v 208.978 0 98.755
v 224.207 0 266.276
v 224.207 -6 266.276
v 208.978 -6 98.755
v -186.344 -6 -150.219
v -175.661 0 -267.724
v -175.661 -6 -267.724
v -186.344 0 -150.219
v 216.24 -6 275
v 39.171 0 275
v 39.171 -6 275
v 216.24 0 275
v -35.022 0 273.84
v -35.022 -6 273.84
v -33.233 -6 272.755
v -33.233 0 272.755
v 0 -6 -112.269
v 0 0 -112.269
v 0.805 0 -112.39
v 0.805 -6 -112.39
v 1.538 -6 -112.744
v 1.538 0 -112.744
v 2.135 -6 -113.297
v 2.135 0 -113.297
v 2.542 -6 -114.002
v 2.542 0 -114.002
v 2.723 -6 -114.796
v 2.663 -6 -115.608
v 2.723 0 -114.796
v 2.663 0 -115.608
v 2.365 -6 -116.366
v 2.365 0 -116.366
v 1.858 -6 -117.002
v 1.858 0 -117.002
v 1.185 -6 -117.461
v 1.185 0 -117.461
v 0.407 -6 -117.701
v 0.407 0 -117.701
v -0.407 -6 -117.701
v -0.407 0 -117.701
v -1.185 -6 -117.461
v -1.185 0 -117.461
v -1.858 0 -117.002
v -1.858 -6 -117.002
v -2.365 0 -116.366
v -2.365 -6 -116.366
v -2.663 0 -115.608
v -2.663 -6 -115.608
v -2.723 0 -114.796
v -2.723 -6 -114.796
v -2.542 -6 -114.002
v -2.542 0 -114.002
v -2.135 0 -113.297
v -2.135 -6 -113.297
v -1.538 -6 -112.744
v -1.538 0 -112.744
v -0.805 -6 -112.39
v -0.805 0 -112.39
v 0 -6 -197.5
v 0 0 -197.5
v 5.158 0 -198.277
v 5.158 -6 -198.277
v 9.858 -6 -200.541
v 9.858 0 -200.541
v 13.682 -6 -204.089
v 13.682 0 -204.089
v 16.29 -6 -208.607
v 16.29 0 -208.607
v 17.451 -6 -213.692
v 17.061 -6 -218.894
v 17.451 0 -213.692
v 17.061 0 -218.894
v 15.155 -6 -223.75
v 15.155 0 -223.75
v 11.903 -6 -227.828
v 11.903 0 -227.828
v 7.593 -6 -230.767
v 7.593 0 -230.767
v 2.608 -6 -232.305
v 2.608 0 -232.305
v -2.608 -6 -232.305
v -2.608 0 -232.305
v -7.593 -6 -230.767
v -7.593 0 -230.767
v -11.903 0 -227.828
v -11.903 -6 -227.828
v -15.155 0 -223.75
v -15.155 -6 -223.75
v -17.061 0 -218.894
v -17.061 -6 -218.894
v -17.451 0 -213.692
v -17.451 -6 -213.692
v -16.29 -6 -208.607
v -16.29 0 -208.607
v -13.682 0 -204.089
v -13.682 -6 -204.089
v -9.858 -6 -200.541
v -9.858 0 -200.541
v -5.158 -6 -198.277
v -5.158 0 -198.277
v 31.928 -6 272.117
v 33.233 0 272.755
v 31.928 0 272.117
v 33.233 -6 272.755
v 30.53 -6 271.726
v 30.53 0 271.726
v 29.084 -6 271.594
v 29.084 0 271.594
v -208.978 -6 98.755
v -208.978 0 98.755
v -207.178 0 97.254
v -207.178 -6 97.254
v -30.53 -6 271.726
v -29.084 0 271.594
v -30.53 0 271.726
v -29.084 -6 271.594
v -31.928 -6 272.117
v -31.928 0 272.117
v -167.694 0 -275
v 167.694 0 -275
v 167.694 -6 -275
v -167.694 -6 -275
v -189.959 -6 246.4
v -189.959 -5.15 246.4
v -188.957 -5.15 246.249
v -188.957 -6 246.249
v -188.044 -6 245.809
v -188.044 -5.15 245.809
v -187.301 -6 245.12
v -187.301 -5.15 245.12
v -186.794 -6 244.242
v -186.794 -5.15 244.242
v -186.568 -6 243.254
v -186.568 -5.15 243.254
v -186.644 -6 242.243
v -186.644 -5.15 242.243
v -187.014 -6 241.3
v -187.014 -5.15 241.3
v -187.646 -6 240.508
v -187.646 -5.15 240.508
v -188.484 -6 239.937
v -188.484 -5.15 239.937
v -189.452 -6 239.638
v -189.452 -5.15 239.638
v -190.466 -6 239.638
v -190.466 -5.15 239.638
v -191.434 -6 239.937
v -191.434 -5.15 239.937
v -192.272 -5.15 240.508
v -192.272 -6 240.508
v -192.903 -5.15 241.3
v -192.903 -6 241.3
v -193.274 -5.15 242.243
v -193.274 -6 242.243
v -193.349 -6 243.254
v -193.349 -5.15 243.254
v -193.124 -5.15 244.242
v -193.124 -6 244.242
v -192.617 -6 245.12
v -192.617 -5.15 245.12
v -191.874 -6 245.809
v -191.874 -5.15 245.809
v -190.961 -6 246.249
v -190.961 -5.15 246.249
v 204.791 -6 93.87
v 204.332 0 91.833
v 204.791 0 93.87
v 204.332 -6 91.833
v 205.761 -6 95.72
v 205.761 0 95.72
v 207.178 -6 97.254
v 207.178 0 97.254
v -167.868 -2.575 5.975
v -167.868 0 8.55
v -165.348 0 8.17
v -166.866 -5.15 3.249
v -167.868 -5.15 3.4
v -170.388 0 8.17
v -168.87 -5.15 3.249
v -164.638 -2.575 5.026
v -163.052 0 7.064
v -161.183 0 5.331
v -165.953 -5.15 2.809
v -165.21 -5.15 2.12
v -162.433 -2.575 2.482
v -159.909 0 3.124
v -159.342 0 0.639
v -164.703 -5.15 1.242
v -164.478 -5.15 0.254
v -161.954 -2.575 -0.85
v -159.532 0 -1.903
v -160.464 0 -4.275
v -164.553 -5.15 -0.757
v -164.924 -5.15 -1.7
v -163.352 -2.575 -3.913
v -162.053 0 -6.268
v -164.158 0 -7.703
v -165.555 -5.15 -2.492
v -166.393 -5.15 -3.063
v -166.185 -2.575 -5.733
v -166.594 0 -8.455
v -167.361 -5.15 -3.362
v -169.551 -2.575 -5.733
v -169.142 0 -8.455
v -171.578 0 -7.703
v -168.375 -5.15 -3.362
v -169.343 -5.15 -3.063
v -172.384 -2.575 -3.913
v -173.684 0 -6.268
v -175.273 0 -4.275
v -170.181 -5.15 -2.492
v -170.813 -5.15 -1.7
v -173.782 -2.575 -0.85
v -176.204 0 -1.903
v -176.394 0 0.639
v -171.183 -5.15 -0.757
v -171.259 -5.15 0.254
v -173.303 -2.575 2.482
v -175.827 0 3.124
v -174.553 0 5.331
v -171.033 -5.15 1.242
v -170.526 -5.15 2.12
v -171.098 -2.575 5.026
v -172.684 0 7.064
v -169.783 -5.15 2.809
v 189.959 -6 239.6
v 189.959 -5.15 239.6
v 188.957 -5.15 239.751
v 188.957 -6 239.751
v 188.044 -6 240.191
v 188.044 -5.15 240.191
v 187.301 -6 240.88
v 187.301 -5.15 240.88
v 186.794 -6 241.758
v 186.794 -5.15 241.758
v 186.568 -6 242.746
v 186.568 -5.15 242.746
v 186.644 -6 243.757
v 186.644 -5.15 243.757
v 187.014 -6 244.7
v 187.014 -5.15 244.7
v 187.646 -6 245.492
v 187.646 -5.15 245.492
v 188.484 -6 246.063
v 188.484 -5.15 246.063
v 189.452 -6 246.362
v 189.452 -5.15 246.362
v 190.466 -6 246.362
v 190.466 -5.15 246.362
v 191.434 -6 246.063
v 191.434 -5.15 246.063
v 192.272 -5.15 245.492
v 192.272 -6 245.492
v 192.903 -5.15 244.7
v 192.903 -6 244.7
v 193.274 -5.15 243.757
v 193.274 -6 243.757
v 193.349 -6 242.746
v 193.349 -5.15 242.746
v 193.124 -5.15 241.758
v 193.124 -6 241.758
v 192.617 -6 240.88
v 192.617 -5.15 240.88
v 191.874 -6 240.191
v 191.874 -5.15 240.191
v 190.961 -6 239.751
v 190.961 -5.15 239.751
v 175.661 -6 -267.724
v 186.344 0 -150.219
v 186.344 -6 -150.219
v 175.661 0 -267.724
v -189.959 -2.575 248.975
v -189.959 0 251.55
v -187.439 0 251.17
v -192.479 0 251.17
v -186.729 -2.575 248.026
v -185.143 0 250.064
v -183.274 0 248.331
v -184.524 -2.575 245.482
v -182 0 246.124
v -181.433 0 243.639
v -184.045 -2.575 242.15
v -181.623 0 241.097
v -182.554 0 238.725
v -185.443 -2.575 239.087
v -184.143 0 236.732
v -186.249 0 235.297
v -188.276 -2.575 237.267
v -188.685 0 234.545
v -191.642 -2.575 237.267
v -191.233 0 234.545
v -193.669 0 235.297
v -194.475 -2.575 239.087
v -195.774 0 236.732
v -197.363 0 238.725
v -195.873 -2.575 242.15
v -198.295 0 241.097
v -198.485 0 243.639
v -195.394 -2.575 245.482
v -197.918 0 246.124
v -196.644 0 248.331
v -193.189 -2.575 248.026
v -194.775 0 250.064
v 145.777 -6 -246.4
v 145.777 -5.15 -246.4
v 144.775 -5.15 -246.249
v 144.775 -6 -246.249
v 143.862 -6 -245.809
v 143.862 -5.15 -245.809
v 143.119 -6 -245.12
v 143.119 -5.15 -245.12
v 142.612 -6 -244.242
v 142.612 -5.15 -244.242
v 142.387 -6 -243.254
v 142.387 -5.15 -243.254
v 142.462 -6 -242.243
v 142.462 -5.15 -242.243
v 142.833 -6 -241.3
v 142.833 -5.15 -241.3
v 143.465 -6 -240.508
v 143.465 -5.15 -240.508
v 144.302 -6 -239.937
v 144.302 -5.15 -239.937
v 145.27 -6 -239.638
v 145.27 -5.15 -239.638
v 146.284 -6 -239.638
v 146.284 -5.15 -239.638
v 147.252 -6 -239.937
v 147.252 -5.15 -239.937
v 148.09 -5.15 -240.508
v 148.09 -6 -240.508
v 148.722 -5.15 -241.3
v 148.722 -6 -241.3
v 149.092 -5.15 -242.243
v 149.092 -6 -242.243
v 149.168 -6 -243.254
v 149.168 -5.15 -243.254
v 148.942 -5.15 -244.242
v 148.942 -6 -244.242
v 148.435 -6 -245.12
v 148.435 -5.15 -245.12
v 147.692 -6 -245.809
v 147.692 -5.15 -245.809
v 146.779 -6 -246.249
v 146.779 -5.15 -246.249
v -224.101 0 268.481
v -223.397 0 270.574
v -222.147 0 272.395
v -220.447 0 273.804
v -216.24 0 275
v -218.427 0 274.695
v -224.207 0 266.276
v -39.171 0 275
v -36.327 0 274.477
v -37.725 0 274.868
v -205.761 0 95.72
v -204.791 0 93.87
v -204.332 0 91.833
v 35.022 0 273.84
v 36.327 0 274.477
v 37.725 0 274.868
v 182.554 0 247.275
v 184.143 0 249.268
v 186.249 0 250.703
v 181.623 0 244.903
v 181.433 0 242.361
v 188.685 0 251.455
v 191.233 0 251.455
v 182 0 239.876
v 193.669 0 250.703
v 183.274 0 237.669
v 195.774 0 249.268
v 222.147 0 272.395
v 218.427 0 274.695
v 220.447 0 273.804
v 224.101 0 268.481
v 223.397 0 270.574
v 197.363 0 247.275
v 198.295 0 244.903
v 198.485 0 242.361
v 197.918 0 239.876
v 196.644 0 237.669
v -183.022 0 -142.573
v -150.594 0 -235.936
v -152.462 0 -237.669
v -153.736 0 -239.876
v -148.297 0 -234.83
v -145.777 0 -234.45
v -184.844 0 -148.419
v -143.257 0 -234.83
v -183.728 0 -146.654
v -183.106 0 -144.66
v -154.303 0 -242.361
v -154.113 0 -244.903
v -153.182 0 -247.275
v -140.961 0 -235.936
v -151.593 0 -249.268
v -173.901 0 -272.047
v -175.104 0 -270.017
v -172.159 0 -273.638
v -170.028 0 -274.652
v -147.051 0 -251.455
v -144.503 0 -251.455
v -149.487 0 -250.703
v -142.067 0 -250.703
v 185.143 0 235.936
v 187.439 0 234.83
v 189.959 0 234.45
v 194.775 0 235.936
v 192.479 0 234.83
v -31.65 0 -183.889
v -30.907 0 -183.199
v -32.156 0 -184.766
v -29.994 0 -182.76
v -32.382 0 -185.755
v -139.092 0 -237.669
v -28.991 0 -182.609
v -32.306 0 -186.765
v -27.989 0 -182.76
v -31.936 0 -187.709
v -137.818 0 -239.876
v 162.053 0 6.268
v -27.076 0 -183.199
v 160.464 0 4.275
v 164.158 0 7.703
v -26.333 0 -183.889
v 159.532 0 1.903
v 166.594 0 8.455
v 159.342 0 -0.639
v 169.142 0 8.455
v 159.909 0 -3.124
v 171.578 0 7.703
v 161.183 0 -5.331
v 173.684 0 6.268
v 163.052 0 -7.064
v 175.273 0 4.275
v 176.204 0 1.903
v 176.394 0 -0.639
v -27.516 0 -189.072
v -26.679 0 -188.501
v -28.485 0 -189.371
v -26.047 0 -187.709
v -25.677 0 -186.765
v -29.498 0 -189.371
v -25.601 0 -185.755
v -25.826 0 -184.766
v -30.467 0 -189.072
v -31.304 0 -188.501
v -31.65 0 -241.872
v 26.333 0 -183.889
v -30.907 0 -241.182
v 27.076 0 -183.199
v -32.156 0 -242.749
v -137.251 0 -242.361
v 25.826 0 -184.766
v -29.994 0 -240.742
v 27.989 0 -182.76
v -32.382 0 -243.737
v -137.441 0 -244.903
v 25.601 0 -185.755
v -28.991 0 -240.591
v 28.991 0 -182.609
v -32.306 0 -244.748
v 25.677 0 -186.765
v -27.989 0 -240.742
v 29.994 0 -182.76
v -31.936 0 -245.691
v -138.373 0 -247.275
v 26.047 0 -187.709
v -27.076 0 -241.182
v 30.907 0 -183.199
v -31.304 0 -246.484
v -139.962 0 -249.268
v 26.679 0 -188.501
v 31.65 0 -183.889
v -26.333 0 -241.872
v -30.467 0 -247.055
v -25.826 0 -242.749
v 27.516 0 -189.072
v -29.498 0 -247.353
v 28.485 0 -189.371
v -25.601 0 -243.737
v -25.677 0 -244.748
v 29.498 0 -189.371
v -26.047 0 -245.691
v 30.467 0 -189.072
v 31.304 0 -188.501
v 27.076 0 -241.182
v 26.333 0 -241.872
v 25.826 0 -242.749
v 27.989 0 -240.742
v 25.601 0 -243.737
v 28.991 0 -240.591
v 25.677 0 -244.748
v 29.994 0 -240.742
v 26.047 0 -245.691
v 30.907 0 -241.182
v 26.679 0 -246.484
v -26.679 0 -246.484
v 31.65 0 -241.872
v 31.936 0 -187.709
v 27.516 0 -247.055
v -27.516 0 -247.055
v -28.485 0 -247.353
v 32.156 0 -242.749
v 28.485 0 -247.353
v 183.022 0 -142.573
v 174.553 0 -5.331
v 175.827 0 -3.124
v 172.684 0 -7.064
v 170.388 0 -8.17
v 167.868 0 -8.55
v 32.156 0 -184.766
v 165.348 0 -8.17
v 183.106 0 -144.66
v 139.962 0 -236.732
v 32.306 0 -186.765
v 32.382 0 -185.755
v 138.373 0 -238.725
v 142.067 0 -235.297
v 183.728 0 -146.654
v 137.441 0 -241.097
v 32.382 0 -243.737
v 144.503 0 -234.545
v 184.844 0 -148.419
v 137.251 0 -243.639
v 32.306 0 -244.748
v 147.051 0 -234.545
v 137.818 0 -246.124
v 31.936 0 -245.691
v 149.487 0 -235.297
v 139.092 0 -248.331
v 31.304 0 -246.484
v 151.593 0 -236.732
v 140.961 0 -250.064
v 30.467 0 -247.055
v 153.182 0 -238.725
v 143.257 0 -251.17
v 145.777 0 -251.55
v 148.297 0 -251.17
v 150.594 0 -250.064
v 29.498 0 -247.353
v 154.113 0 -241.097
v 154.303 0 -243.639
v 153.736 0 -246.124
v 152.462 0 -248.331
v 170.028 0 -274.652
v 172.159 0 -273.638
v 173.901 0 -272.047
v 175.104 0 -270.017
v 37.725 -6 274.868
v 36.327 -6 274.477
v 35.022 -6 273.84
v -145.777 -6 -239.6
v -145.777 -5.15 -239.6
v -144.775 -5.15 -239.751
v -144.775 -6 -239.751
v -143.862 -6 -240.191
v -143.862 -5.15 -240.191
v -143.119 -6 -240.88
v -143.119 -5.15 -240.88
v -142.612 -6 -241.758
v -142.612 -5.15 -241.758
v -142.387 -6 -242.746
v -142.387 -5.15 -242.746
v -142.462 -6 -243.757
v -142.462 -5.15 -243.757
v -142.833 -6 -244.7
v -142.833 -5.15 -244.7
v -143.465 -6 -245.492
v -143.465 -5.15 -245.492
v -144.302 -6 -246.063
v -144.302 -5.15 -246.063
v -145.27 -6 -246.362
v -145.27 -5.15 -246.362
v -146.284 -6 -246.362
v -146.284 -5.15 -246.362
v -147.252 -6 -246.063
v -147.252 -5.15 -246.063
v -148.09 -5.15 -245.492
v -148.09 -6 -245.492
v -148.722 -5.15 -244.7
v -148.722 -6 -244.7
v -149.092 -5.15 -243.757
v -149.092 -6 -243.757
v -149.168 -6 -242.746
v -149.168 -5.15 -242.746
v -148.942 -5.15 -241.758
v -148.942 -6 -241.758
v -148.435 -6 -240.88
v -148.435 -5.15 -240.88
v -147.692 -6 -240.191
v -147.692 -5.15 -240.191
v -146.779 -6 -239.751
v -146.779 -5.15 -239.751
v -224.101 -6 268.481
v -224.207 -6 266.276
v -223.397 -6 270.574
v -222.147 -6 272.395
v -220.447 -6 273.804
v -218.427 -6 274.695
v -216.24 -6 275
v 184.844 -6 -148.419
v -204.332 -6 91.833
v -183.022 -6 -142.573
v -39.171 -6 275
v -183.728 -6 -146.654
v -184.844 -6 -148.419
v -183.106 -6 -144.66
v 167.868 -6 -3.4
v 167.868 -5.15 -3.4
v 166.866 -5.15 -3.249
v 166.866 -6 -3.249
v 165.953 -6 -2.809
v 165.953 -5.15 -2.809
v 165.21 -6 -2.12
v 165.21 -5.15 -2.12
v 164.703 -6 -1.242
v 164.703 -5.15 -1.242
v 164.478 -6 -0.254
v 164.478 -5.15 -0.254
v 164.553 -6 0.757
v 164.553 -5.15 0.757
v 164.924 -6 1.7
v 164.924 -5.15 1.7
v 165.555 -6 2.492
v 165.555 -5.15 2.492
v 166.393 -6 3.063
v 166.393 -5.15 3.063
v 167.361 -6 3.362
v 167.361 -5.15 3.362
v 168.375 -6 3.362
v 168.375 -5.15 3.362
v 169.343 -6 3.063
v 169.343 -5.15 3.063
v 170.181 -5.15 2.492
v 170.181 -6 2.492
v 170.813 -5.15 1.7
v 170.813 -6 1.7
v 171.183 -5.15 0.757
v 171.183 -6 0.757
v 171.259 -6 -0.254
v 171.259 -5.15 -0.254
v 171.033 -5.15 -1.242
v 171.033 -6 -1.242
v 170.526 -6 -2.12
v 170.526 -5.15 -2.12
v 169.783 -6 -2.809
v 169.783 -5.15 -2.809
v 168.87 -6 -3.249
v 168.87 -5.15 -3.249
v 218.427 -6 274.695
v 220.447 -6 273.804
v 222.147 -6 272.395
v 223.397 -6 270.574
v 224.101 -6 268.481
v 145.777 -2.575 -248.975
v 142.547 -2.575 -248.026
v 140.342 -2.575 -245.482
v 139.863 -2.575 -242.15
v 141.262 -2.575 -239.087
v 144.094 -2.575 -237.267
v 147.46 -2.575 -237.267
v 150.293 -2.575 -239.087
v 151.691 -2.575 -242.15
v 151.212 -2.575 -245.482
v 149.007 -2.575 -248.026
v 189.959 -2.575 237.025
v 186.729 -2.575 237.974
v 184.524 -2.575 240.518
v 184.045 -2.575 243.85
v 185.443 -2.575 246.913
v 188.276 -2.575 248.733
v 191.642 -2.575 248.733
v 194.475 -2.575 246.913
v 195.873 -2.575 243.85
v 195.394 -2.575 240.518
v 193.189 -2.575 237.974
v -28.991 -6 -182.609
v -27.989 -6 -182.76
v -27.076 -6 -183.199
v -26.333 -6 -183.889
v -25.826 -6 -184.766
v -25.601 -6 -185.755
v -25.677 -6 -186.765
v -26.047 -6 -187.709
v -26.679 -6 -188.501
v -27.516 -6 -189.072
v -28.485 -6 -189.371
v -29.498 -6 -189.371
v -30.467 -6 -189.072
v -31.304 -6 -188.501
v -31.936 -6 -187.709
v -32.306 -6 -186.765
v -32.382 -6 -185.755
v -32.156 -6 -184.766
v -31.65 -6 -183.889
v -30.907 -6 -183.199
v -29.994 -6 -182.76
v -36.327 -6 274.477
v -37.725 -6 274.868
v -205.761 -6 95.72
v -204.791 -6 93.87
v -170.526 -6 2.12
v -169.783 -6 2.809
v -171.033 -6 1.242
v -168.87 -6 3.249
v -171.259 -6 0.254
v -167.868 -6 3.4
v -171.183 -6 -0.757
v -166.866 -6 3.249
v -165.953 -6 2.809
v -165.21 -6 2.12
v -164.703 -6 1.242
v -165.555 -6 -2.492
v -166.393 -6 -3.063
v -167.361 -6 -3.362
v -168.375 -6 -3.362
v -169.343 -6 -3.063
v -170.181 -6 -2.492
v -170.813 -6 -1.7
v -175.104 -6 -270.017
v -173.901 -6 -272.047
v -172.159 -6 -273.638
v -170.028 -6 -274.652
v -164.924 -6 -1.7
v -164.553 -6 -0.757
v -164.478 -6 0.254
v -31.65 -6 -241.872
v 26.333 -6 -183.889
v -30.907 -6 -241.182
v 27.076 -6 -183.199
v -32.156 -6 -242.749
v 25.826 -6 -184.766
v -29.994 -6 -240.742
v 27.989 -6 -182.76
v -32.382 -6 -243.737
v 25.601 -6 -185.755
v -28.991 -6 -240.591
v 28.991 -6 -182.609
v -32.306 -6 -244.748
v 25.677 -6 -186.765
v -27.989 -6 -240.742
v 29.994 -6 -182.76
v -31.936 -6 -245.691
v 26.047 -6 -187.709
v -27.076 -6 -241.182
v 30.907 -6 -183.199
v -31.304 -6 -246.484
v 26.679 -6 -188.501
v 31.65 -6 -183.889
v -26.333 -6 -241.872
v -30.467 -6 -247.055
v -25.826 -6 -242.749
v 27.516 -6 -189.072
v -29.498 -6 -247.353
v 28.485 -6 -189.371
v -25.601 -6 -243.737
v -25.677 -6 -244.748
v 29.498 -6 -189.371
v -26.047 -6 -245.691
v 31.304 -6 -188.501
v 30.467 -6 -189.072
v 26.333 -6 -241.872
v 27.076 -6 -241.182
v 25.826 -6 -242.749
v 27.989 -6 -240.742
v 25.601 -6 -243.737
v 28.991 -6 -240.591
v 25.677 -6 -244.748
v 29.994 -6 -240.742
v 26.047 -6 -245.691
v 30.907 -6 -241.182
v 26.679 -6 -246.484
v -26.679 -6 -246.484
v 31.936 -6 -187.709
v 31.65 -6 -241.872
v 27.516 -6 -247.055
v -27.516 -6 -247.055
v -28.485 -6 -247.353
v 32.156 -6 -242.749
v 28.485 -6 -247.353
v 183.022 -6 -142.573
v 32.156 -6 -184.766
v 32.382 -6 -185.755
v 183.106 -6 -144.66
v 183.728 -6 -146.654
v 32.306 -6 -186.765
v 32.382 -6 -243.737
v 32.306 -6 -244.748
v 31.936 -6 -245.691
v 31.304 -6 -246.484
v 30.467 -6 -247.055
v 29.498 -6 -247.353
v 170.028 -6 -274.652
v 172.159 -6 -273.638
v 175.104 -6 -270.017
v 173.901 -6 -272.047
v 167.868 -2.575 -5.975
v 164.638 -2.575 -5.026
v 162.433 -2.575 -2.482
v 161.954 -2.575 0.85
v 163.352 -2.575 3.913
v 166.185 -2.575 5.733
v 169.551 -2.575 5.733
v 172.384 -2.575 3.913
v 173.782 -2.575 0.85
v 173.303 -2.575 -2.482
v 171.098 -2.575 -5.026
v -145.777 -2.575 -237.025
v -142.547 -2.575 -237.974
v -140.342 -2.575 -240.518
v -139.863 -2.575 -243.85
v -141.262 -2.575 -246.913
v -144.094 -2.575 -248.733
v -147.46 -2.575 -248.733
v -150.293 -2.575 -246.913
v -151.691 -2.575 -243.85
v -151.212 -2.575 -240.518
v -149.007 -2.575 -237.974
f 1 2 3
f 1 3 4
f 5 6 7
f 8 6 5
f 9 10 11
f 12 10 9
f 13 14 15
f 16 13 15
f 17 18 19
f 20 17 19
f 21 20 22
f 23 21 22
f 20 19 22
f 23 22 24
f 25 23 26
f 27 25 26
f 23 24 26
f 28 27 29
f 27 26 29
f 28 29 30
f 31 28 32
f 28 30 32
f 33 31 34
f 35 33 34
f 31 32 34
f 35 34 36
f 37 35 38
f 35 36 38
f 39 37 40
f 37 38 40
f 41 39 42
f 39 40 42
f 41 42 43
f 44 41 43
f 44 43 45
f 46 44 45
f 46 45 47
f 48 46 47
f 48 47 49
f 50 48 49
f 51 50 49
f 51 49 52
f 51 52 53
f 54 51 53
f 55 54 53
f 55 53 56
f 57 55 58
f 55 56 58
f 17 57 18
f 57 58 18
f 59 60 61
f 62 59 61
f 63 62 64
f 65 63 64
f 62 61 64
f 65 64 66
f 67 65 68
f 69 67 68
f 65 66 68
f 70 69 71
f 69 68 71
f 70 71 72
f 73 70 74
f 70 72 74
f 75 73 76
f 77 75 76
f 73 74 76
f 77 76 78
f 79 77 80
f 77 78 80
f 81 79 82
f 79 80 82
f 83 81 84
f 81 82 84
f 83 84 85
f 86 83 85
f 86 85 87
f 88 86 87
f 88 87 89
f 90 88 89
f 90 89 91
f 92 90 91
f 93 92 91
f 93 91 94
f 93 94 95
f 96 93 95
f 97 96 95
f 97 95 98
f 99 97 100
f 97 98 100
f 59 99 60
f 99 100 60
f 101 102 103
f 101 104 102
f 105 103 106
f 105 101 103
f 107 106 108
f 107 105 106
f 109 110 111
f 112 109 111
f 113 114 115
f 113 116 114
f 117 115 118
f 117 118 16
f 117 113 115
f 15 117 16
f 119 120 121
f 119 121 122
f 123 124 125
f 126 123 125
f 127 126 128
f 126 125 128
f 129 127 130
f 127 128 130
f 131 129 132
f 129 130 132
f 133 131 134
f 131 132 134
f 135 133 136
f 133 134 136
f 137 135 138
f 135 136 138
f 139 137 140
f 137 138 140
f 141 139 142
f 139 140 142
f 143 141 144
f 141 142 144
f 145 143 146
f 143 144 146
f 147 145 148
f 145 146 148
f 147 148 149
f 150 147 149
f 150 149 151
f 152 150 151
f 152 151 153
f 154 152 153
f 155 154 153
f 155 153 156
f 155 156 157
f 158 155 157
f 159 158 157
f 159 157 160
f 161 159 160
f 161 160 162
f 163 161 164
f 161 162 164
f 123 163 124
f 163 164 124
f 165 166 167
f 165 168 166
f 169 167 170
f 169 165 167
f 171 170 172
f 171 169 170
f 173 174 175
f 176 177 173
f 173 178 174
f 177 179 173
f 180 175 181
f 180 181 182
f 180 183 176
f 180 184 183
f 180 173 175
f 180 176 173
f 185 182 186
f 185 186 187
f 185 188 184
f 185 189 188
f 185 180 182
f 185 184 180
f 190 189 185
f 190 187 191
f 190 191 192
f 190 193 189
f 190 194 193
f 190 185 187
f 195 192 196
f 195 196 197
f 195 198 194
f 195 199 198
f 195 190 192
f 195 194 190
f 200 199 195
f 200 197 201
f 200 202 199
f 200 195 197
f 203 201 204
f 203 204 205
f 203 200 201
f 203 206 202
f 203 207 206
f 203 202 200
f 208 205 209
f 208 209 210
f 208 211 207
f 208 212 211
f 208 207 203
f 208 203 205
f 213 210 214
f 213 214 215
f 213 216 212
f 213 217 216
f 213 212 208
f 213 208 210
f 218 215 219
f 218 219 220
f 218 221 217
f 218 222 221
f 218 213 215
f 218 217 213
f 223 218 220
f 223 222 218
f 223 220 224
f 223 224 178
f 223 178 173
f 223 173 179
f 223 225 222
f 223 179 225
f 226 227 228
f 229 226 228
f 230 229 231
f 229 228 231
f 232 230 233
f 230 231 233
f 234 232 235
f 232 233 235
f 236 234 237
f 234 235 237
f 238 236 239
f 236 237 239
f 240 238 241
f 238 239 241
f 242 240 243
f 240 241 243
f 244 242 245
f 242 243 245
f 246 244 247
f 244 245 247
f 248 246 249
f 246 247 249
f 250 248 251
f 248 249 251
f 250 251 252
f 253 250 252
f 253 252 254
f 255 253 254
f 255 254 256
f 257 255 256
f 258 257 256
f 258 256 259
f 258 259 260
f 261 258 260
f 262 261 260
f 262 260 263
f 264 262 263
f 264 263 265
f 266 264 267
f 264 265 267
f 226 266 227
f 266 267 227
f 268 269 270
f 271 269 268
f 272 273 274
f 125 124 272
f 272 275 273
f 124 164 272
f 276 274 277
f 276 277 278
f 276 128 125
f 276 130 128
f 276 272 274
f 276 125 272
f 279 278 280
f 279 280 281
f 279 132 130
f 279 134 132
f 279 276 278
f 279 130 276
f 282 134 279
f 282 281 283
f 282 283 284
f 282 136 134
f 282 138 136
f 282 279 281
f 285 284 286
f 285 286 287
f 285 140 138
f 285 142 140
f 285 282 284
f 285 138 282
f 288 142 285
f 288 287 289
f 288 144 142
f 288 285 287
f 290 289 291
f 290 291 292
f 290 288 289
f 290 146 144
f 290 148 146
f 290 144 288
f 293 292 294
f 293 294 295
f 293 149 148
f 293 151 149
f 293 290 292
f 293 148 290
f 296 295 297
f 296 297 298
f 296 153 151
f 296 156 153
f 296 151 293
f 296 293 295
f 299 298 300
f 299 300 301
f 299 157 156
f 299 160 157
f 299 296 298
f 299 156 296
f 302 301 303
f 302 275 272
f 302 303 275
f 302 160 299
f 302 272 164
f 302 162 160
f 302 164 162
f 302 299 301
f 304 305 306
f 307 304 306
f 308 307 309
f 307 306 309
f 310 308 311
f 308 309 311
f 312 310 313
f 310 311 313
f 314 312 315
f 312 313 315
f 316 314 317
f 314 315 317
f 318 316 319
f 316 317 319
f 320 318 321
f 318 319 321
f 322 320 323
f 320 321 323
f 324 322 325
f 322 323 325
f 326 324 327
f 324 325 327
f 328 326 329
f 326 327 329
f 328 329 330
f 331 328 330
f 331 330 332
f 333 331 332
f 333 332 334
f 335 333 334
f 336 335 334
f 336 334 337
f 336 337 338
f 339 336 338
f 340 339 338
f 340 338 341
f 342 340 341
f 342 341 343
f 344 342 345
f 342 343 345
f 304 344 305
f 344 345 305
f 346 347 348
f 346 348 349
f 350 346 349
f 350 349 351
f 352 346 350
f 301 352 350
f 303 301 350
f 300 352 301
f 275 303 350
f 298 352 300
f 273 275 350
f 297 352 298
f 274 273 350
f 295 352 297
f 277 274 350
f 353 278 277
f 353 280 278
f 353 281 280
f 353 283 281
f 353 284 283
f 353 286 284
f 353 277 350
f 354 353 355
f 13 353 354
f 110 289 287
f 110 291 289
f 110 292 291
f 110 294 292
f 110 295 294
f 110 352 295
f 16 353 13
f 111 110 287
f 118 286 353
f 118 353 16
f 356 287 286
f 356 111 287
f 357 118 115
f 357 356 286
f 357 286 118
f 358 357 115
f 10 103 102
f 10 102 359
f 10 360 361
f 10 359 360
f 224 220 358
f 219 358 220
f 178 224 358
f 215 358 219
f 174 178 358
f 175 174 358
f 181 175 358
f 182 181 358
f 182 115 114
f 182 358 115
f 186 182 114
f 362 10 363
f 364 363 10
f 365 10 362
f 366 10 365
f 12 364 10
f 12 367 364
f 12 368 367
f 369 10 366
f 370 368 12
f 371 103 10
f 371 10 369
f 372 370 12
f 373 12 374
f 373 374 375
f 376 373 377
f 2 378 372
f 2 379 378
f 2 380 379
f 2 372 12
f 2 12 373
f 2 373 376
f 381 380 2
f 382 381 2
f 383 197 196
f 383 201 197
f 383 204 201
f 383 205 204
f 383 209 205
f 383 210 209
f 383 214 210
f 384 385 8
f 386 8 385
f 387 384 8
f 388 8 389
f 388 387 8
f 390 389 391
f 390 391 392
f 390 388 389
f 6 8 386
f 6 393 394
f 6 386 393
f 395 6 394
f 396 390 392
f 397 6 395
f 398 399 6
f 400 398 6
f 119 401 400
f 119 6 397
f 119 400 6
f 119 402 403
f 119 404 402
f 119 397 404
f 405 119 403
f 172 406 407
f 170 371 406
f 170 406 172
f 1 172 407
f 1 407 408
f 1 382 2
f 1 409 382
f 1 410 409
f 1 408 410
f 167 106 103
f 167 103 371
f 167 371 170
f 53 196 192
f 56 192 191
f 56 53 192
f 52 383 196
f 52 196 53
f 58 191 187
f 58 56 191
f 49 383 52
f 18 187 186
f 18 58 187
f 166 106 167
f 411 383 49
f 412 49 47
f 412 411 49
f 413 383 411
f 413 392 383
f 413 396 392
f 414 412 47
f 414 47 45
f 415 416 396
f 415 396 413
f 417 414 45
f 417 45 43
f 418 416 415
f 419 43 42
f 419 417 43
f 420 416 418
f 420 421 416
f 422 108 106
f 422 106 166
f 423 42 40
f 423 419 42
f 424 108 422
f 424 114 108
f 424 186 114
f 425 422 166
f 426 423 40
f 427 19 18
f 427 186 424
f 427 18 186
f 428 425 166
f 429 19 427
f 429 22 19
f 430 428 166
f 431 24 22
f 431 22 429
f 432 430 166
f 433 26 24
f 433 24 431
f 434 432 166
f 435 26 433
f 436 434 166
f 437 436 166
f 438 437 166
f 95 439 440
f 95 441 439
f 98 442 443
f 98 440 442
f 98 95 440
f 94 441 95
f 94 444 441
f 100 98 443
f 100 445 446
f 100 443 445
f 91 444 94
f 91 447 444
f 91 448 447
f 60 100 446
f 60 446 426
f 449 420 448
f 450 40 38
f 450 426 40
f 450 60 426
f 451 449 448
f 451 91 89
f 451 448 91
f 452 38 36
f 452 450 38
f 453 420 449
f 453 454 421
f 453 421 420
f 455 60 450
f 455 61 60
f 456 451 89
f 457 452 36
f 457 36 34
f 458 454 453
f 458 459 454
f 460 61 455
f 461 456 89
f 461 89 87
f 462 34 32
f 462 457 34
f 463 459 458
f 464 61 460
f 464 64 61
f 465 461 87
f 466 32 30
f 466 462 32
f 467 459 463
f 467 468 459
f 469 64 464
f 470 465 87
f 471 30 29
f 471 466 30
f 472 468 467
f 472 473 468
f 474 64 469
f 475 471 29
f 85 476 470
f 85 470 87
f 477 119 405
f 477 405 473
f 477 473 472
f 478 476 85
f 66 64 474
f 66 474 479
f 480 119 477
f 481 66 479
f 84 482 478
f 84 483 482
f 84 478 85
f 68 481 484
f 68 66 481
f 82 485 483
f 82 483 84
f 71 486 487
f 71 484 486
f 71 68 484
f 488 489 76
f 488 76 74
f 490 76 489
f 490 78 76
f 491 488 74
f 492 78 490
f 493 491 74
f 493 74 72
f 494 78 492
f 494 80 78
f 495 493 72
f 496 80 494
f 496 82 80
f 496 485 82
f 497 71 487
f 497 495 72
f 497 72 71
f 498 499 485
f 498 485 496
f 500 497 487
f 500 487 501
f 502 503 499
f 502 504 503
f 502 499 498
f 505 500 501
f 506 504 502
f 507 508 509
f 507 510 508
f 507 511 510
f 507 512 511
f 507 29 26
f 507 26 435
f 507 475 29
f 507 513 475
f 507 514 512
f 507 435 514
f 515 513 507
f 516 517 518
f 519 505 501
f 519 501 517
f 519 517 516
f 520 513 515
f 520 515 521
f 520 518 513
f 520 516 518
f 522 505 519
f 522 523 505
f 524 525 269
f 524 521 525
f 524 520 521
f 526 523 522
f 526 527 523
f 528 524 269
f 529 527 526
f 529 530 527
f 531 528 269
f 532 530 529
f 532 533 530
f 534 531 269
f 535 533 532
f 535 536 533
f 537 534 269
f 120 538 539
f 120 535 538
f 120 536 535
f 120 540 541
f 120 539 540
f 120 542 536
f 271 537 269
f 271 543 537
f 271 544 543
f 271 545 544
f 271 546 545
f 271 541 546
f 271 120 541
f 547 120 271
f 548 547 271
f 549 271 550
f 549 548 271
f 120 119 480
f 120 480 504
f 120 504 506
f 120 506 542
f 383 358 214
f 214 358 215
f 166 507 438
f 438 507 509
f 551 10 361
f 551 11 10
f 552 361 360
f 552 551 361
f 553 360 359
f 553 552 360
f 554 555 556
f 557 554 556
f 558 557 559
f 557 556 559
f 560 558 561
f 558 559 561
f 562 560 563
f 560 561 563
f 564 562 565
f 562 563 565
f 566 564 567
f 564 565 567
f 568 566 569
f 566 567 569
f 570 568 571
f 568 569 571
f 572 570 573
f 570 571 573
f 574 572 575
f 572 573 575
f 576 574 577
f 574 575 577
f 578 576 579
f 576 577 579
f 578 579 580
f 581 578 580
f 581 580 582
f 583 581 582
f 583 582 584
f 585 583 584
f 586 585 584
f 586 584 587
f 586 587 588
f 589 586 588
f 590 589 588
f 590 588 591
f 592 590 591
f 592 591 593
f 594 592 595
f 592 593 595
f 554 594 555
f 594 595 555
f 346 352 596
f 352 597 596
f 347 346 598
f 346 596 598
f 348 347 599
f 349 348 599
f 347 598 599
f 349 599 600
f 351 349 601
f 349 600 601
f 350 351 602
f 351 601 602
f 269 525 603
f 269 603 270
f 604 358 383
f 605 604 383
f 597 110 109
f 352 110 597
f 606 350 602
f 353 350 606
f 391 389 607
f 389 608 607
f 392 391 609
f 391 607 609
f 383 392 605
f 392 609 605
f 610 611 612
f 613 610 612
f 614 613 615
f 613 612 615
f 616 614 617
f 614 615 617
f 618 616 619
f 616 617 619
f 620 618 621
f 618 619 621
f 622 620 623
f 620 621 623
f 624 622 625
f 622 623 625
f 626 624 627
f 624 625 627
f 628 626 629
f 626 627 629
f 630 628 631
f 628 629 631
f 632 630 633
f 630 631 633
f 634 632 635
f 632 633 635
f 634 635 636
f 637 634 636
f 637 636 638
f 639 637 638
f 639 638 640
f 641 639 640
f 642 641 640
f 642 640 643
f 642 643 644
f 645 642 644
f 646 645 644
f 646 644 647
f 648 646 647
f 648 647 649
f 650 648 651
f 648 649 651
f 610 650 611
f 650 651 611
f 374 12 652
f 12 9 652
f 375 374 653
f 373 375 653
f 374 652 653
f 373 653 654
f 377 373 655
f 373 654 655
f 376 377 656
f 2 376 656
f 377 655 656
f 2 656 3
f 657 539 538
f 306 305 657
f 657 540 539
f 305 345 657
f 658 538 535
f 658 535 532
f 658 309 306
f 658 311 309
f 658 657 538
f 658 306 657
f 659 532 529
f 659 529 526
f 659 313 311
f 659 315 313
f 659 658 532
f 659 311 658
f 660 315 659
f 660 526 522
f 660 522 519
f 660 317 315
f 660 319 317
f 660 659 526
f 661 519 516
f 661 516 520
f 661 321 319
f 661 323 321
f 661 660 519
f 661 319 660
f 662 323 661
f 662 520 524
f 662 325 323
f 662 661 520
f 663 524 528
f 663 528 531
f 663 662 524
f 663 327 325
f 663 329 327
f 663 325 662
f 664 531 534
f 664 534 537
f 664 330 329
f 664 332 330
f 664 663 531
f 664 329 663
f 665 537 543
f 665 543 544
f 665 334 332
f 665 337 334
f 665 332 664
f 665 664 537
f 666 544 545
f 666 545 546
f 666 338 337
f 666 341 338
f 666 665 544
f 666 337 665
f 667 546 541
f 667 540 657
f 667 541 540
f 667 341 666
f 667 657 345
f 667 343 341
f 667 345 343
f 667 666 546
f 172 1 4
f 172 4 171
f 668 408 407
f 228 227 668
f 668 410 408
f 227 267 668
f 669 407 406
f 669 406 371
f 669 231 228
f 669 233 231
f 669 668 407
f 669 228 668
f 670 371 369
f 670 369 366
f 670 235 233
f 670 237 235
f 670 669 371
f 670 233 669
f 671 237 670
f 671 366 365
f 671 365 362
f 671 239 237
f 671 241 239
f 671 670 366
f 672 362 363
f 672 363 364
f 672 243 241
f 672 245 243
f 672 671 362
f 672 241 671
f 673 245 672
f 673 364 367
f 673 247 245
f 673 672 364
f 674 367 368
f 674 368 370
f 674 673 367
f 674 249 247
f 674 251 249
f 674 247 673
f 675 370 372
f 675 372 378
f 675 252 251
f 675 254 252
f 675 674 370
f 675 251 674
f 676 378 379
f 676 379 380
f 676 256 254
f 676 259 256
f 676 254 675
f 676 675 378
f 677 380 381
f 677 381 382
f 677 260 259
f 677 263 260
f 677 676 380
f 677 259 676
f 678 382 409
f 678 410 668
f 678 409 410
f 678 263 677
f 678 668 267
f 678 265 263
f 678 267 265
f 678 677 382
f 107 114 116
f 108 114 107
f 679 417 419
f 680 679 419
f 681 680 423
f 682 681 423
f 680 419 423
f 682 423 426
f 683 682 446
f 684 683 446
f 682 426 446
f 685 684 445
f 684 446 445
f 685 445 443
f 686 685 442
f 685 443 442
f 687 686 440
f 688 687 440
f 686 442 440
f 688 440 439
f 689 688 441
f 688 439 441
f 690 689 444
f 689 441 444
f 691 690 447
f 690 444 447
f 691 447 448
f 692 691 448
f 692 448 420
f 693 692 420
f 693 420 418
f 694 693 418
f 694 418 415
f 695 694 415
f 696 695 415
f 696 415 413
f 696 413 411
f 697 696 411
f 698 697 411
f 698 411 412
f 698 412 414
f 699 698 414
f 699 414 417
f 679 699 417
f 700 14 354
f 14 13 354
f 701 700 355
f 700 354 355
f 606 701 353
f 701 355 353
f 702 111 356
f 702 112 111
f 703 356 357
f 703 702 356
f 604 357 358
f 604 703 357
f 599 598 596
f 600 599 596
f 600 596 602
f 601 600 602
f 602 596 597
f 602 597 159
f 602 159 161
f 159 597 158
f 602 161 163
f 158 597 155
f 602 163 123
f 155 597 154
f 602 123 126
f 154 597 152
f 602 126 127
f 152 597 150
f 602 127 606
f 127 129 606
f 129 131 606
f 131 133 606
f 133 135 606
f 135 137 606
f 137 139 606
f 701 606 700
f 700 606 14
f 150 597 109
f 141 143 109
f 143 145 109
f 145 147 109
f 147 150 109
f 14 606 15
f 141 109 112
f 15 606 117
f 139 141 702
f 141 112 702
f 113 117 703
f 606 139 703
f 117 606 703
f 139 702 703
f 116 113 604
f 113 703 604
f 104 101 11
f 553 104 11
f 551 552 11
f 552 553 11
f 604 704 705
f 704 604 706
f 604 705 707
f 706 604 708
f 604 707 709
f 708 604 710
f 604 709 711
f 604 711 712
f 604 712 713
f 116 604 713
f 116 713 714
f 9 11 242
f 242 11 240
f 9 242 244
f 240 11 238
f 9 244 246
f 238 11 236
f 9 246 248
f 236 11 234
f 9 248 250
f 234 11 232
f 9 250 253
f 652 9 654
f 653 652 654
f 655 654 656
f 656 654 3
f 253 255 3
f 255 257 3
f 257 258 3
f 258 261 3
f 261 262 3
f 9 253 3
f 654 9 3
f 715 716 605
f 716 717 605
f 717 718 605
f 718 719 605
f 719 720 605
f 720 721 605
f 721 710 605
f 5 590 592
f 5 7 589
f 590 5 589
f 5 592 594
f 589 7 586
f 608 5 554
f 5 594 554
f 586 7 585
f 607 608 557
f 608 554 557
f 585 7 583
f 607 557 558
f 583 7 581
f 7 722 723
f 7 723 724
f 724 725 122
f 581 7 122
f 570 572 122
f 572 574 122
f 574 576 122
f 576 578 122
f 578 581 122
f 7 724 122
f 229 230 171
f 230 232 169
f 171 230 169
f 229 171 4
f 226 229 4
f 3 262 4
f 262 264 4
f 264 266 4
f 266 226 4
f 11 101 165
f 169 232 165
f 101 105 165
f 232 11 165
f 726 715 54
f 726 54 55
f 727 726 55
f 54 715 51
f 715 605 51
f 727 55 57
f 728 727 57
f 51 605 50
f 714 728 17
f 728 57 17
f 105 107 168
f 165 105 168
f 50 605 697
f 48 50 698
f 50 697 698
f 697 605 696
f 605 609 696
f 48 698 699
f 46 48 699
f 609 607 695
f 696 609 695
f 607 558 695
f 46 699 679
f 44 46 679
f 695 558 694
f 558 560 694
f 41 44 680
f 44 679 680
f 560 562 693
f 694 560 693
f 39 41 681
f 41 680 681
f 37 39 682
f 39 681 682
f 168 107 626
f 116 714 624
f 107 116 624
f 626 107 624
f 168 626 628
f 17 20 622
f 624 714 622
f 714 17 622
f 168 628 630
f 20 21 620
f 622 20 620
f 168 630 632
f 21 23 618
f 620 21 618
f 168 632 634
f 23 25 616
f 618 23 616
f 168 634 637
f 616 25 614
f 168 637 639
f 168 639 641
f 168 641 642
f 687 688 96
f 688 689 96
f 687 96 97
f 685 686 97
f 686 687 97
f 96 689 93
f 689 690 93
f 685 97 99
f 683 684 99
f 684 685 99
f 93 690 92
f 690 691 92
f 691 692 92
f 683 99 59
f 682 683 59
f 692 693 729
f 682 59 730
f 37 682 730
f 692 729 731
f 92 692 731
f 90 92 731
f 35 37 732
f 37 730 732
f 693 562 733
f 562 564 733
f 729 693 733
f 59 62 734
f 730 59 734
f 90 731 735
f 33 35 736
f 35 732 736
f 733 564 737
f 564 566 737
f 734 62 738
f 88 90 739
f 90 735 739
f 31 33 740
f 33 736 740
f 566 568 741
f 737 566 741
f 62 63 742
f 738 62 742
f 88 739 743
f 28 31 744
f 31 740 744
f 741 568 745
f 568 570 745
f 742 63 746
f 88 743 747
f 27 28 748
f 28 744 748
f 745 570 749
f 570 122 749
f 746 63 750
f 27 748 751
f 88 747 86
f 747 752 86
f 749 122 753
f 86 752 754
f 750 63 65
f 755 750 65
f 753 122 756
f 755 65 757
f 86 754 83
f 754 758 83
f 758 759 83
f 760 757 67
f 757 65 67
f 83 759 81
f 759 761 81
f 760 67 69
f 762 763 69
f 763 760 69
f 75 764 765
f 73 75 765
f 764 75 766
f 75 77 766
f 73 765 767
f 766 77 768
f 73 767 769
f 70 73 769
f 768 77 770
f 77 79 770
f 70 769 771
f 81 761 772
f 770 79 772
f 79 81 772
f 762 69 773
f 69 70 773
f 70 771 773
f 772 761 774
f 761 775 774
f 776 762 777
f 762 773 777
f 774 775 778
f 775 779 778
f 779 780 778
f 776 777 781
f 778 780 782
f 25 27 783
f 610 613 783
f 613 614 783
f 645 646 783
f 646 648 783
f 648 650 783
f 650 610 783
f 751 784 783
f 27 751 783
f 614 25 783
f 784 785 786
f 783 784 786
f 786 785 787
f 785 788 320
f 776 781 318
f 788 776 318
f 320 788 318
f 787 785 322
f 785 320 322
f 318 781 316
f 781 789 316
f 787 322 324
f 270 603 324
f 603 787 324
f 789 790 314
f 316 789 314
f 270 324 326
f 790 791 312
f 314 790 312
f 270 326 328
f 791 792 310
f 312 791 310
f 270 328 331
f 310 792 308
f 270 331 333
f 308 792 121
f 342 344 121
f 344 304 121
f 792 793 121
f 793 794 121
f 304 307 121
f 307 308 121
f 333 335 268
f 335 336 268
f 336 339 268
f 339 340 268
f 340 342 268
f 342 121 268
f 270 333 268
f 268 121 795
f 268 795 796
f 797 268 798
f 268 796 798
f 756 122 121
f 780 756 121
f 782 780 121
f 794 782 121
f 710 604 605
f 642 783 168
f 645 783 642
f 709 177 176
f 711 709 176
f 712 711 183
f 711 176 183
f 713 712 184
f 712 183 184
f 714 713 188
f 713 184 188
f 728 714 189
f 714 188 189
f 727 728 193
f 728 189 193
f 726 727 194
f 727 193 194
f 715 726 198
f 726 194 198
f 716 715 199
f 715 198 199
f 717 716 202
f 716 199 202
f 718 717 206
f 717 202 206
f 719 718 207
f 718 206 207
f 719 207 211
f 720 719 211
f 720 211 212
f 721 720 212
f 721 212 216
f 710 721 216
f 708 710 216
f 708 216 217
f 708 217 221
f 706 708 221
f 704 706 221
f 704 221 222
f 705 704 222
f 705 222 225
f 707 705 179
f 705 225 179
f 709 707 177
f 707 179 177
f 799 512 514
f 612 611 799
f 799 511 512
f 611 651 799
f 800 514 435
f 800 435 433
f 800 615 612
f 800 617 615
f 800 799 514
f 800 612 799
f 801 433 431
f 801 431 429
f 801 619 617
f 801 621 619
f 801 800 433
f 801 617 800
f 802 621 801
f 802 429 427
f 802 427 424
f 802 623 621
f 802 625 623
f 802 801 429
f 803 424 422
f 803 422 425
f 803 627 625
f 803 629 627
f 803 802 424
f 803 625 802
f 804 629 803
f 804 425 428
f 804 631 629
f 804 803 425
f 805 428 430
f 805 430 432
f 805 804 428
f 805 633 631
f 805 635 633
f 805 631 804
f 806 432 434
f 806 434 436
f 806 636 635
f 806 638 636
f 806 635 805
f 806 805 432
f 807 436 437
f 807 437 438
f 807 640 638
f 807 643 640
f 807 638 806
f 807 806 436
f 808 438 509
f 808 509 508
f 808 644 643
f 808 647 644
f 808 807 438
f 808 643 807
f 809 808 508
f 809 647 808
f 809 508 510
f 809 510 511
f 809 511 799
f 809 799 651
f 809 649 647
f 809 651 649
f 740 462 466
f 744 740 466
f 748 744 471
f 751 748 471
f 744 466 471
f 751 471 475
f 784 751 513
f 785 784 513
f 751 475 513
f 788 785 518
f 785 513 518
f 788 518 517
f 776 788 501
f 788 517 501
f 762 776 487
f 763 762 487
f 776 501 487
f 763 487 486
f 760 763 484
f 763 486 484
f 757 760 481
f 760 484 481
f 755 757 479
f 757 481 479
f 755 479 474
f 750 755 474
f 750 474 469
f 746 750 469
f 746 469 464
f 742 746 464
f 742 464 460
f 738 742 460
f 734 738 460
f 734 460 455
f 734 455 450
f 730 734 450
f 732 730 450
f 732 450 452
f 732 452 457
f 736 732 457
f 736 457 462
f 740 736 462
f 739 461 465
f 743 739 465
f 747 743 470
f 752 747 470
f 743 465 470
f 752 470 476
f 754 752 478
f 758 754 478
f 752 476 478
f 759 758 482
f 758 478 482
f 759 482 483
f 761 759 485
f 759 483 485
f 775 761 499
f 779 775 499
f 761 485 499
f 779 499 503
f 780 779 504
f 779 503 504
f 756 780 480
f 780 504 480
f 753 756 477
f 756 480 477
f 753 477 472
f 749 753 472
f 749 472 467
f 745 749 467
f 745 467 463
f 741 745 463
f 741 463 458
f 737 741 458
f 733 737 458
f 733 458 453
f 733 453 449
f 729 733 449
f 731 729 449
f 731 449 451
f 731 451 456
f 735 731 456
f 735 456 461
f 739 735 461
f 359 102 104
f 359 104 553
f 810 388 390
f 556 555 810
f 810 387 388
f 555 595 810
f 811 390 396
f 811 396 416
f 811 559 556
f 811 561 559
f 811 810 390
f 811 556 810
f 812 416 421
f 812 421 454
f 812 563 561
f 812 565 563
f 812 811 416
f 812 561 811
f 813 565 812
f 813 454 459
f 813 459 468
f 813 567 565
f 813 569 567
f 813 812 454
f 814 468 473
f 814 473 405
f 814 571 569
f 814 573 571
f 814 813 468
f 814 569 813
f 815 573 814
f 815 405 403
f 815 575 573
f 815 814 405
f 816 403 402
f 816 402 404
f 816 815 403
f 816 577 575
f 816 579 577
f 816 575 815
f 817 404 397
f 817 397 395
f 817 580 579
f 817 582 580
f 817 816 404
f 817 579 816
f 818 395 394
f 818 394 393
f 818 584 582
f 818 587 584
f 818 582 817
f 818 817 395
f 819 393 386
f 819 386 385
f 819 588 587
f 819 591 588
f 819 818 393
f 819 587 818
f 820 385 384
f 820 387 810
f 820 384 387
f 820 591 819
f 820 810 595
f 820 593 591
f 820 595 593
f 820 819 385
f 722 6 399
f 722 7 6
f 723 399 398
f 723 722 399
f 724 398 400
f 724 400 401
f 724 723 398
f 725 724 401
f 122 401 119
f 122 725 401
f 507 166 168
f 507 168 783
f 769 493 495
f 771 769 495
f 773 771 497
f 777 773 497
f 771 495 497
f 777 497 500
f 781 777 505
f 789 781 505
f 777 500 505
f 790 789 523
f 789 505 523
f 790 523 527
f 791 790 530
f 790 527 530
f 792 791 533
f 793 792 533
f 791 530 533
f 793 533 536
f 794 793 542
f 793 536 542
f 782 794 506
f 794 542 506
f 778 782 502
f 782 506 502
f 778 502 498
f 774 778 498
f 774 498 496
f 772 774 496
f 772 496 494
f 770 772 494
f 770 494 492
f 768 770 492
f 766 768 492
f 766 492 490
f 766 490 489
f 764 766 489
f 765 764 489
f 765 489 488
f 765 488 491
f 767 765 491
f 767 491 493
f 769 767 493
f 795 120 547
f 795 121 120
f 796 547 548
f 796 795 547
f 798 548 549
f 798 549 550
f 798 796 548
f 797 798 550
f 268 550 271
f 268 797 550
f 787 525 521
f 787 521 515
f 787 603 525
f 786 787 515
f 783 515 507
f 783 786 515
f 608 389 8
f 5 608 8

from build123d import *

# Parameters (mm, degrees)
SKETCH1_R           = 17.5
SKETCH1_R_2         = 3.4
SKETCH1_R_3         = 2.731026391
BOSS_EXTRUDE1_DEPTH = 6
FILLET1_R           = 8
SKETCH5_R           = 3.4
CUT_EXTRUDE4_DEPTH  = 20
CUT_EXTRUDE5_DEPTH  = 10
CUT_EXTRUDE6_DEPTH  = 10
FILLET2_R           = 8
CHAMFER1_SIZE       = 5.15


with BuildPart() as part:
    # Sketch1 → Boss-Extrude1 (new body)
    with BuildSketch(Plane(origin=(0, 0, 0), x_dir=(1, 0, 0), z_dir=(0, 1, 0))):
        Polygon((-175, 275), (-225, -275), (225, -275), (175, 275), align=None)
        with Locations(Location((0, 215, 0), (0, 0, 270))):
            Circle(SKETCH1_R, mode=Mode.SUBTRACT)
        with Locations(Location((-145.777131586, 243, 0), (0, 0, 270))):
            Circle(SKETCH1_R_2, mode=Mode.SUBTRACT)
        with Locations(Location((145.777131586, 243, 0), (0, 0, 90))):
            Circle(SKETCH1_R_2, mode=Mode.SUBTRACT)
        with Locations(Location((-189.958949768, -243, 0), (0, 0, 270))):
            Circle(SKETCH1_R_2, mode=Mode.SUBTRACT)
        with Locations(Location((189.958949768, -243, 0), (0, 0, 90))):
            Circle(SKETCH1_R_2, mode=Mode.SUBTRACT)
        with Locations(Location((-167.868040677, 0, 0), (0, 0, 270))):
            Circle(SKETCH1_R_2, mode=Mode.SUBTRACT)
        with Locations(Location((167.868040677, 0, 0), (0, 0, 90))):
            Circle(SKETCH1_R_2, mode=Mode.SUBTRACT)
        with Locations(Location((0, 115, 0), (0, 0, 270))):
            Circle(SKETCH1_R_3, mode=Mode.SUBTRACT)
    extrude(amount=-BOSS_EXTRUDE1_DEPTH)

    # Fillet1
    fillet1_edges = [part.edges().sort_by_distance(p)[0] for p in [
        (175, -3, -275),
        (225, -3, 275),
        (-225, -3, 275),
        (-175, -3, -275),
    ]]
    fillet(fillet1_edges, radius=FILLET1_R)

    # Sketch5 → Cut-Extrude4 (cut)
    with BuildSketch(Plane(origin=(0, 0, 377.333920735), x_dir=(0, 0, 1), z_dir=(0, 1, 0))):
        with Locations((-563.342542706, 28.991378029)):
            Circle(SKETCH5_R)
        with Locations((-563.342542706, -28.991378029)):
            Circle(SKETCH5_R)
        with Locations((-621.325298763, -28.991378029)):
            Circle(SKETCH5_R)
        with Locations((-621.325298763, 28.991378029)):
            Circle(SKETCH5_R)
    extrude(amount=-CUT_EXTRUDE4_DEPTH, mode=Mode.SUBTRACT)

    # Sketch6 → Cut-Extrude5 (cut)
    with BuildSketch(Plane(origin=(0, 0, 0), x_dir=(1, 0, 0), z_dir=(0, 1, 0))):
        Polygon((-204.631966366, -95.133074099), (-182.722315824, 145.873081867), (-194.245635018, 159.701064899), (-218.459949399, -106.656393293), align=None)
    cut_extrude5 = extrude(amount=-CUT_EXTRUDE5_DEPTH, mode=Mode.SUBTRACT)

    # Sketch7 → Cut-Extrude6 (cut)
    with BuildSketch(Plane(origin=(0, 0, 0), x_dir=(1, 0, 0), z_dir=(0, 1, 0))):
        Polygon((-31.320564901, -271.594250629), (31.320564901, -271.594250629), (45, -279.893229805), (-45, -279.893229805), align=None)
    extrude(amount=-CUT_EXTRUDE6_DEPTH, mode=Mode.SUBTRACT)

    # Mirror2: Cut-Extrude5 across plane
    add(cut_extrude5.mirror(Plane(origin=(0, 0, 0), x_dir=(0, 0, 1), z_dir=(1, 0, 0))), mode=Mode.SUBTRACT)

    # Fillet2
    fillet2_edges = [part.edges().sort_by_distance(p)[0] for p in [
        (-182.722315824, -3, -145.873081867),
        (-204.631966366, -3, 95.133074099),
        (36.934355042, -3, 275),
        (-36.934355042, -3, 275),
        (-31.320564901, -3, 271.594250629),
        (31.320564901, -3, 271.594250629),
        (204.631966366, -3, 95.133074099),
        (182.722315824, -3, -145.873081867),
    ]]
    fillet(fillet2_edges, radius=FILLET2_R)

    # Chamfer1
    chamfer1_edges = [part.edges().sort_by_distance(p)[0] for p in [
        (-145.777131586, 0, -246.4),
        (145.777131586, 0, -239.6),
        (-189.958949768, 0, 239.6),
        (189.958949768, 0, 246.4),
        (-167.868040677, 0, -3.4),
        (167.868040677, 0, 3.4),
    ]]
    chamfer(chamfer1_edges, length=CHAMFER1_SIZE)


solid = part.part
